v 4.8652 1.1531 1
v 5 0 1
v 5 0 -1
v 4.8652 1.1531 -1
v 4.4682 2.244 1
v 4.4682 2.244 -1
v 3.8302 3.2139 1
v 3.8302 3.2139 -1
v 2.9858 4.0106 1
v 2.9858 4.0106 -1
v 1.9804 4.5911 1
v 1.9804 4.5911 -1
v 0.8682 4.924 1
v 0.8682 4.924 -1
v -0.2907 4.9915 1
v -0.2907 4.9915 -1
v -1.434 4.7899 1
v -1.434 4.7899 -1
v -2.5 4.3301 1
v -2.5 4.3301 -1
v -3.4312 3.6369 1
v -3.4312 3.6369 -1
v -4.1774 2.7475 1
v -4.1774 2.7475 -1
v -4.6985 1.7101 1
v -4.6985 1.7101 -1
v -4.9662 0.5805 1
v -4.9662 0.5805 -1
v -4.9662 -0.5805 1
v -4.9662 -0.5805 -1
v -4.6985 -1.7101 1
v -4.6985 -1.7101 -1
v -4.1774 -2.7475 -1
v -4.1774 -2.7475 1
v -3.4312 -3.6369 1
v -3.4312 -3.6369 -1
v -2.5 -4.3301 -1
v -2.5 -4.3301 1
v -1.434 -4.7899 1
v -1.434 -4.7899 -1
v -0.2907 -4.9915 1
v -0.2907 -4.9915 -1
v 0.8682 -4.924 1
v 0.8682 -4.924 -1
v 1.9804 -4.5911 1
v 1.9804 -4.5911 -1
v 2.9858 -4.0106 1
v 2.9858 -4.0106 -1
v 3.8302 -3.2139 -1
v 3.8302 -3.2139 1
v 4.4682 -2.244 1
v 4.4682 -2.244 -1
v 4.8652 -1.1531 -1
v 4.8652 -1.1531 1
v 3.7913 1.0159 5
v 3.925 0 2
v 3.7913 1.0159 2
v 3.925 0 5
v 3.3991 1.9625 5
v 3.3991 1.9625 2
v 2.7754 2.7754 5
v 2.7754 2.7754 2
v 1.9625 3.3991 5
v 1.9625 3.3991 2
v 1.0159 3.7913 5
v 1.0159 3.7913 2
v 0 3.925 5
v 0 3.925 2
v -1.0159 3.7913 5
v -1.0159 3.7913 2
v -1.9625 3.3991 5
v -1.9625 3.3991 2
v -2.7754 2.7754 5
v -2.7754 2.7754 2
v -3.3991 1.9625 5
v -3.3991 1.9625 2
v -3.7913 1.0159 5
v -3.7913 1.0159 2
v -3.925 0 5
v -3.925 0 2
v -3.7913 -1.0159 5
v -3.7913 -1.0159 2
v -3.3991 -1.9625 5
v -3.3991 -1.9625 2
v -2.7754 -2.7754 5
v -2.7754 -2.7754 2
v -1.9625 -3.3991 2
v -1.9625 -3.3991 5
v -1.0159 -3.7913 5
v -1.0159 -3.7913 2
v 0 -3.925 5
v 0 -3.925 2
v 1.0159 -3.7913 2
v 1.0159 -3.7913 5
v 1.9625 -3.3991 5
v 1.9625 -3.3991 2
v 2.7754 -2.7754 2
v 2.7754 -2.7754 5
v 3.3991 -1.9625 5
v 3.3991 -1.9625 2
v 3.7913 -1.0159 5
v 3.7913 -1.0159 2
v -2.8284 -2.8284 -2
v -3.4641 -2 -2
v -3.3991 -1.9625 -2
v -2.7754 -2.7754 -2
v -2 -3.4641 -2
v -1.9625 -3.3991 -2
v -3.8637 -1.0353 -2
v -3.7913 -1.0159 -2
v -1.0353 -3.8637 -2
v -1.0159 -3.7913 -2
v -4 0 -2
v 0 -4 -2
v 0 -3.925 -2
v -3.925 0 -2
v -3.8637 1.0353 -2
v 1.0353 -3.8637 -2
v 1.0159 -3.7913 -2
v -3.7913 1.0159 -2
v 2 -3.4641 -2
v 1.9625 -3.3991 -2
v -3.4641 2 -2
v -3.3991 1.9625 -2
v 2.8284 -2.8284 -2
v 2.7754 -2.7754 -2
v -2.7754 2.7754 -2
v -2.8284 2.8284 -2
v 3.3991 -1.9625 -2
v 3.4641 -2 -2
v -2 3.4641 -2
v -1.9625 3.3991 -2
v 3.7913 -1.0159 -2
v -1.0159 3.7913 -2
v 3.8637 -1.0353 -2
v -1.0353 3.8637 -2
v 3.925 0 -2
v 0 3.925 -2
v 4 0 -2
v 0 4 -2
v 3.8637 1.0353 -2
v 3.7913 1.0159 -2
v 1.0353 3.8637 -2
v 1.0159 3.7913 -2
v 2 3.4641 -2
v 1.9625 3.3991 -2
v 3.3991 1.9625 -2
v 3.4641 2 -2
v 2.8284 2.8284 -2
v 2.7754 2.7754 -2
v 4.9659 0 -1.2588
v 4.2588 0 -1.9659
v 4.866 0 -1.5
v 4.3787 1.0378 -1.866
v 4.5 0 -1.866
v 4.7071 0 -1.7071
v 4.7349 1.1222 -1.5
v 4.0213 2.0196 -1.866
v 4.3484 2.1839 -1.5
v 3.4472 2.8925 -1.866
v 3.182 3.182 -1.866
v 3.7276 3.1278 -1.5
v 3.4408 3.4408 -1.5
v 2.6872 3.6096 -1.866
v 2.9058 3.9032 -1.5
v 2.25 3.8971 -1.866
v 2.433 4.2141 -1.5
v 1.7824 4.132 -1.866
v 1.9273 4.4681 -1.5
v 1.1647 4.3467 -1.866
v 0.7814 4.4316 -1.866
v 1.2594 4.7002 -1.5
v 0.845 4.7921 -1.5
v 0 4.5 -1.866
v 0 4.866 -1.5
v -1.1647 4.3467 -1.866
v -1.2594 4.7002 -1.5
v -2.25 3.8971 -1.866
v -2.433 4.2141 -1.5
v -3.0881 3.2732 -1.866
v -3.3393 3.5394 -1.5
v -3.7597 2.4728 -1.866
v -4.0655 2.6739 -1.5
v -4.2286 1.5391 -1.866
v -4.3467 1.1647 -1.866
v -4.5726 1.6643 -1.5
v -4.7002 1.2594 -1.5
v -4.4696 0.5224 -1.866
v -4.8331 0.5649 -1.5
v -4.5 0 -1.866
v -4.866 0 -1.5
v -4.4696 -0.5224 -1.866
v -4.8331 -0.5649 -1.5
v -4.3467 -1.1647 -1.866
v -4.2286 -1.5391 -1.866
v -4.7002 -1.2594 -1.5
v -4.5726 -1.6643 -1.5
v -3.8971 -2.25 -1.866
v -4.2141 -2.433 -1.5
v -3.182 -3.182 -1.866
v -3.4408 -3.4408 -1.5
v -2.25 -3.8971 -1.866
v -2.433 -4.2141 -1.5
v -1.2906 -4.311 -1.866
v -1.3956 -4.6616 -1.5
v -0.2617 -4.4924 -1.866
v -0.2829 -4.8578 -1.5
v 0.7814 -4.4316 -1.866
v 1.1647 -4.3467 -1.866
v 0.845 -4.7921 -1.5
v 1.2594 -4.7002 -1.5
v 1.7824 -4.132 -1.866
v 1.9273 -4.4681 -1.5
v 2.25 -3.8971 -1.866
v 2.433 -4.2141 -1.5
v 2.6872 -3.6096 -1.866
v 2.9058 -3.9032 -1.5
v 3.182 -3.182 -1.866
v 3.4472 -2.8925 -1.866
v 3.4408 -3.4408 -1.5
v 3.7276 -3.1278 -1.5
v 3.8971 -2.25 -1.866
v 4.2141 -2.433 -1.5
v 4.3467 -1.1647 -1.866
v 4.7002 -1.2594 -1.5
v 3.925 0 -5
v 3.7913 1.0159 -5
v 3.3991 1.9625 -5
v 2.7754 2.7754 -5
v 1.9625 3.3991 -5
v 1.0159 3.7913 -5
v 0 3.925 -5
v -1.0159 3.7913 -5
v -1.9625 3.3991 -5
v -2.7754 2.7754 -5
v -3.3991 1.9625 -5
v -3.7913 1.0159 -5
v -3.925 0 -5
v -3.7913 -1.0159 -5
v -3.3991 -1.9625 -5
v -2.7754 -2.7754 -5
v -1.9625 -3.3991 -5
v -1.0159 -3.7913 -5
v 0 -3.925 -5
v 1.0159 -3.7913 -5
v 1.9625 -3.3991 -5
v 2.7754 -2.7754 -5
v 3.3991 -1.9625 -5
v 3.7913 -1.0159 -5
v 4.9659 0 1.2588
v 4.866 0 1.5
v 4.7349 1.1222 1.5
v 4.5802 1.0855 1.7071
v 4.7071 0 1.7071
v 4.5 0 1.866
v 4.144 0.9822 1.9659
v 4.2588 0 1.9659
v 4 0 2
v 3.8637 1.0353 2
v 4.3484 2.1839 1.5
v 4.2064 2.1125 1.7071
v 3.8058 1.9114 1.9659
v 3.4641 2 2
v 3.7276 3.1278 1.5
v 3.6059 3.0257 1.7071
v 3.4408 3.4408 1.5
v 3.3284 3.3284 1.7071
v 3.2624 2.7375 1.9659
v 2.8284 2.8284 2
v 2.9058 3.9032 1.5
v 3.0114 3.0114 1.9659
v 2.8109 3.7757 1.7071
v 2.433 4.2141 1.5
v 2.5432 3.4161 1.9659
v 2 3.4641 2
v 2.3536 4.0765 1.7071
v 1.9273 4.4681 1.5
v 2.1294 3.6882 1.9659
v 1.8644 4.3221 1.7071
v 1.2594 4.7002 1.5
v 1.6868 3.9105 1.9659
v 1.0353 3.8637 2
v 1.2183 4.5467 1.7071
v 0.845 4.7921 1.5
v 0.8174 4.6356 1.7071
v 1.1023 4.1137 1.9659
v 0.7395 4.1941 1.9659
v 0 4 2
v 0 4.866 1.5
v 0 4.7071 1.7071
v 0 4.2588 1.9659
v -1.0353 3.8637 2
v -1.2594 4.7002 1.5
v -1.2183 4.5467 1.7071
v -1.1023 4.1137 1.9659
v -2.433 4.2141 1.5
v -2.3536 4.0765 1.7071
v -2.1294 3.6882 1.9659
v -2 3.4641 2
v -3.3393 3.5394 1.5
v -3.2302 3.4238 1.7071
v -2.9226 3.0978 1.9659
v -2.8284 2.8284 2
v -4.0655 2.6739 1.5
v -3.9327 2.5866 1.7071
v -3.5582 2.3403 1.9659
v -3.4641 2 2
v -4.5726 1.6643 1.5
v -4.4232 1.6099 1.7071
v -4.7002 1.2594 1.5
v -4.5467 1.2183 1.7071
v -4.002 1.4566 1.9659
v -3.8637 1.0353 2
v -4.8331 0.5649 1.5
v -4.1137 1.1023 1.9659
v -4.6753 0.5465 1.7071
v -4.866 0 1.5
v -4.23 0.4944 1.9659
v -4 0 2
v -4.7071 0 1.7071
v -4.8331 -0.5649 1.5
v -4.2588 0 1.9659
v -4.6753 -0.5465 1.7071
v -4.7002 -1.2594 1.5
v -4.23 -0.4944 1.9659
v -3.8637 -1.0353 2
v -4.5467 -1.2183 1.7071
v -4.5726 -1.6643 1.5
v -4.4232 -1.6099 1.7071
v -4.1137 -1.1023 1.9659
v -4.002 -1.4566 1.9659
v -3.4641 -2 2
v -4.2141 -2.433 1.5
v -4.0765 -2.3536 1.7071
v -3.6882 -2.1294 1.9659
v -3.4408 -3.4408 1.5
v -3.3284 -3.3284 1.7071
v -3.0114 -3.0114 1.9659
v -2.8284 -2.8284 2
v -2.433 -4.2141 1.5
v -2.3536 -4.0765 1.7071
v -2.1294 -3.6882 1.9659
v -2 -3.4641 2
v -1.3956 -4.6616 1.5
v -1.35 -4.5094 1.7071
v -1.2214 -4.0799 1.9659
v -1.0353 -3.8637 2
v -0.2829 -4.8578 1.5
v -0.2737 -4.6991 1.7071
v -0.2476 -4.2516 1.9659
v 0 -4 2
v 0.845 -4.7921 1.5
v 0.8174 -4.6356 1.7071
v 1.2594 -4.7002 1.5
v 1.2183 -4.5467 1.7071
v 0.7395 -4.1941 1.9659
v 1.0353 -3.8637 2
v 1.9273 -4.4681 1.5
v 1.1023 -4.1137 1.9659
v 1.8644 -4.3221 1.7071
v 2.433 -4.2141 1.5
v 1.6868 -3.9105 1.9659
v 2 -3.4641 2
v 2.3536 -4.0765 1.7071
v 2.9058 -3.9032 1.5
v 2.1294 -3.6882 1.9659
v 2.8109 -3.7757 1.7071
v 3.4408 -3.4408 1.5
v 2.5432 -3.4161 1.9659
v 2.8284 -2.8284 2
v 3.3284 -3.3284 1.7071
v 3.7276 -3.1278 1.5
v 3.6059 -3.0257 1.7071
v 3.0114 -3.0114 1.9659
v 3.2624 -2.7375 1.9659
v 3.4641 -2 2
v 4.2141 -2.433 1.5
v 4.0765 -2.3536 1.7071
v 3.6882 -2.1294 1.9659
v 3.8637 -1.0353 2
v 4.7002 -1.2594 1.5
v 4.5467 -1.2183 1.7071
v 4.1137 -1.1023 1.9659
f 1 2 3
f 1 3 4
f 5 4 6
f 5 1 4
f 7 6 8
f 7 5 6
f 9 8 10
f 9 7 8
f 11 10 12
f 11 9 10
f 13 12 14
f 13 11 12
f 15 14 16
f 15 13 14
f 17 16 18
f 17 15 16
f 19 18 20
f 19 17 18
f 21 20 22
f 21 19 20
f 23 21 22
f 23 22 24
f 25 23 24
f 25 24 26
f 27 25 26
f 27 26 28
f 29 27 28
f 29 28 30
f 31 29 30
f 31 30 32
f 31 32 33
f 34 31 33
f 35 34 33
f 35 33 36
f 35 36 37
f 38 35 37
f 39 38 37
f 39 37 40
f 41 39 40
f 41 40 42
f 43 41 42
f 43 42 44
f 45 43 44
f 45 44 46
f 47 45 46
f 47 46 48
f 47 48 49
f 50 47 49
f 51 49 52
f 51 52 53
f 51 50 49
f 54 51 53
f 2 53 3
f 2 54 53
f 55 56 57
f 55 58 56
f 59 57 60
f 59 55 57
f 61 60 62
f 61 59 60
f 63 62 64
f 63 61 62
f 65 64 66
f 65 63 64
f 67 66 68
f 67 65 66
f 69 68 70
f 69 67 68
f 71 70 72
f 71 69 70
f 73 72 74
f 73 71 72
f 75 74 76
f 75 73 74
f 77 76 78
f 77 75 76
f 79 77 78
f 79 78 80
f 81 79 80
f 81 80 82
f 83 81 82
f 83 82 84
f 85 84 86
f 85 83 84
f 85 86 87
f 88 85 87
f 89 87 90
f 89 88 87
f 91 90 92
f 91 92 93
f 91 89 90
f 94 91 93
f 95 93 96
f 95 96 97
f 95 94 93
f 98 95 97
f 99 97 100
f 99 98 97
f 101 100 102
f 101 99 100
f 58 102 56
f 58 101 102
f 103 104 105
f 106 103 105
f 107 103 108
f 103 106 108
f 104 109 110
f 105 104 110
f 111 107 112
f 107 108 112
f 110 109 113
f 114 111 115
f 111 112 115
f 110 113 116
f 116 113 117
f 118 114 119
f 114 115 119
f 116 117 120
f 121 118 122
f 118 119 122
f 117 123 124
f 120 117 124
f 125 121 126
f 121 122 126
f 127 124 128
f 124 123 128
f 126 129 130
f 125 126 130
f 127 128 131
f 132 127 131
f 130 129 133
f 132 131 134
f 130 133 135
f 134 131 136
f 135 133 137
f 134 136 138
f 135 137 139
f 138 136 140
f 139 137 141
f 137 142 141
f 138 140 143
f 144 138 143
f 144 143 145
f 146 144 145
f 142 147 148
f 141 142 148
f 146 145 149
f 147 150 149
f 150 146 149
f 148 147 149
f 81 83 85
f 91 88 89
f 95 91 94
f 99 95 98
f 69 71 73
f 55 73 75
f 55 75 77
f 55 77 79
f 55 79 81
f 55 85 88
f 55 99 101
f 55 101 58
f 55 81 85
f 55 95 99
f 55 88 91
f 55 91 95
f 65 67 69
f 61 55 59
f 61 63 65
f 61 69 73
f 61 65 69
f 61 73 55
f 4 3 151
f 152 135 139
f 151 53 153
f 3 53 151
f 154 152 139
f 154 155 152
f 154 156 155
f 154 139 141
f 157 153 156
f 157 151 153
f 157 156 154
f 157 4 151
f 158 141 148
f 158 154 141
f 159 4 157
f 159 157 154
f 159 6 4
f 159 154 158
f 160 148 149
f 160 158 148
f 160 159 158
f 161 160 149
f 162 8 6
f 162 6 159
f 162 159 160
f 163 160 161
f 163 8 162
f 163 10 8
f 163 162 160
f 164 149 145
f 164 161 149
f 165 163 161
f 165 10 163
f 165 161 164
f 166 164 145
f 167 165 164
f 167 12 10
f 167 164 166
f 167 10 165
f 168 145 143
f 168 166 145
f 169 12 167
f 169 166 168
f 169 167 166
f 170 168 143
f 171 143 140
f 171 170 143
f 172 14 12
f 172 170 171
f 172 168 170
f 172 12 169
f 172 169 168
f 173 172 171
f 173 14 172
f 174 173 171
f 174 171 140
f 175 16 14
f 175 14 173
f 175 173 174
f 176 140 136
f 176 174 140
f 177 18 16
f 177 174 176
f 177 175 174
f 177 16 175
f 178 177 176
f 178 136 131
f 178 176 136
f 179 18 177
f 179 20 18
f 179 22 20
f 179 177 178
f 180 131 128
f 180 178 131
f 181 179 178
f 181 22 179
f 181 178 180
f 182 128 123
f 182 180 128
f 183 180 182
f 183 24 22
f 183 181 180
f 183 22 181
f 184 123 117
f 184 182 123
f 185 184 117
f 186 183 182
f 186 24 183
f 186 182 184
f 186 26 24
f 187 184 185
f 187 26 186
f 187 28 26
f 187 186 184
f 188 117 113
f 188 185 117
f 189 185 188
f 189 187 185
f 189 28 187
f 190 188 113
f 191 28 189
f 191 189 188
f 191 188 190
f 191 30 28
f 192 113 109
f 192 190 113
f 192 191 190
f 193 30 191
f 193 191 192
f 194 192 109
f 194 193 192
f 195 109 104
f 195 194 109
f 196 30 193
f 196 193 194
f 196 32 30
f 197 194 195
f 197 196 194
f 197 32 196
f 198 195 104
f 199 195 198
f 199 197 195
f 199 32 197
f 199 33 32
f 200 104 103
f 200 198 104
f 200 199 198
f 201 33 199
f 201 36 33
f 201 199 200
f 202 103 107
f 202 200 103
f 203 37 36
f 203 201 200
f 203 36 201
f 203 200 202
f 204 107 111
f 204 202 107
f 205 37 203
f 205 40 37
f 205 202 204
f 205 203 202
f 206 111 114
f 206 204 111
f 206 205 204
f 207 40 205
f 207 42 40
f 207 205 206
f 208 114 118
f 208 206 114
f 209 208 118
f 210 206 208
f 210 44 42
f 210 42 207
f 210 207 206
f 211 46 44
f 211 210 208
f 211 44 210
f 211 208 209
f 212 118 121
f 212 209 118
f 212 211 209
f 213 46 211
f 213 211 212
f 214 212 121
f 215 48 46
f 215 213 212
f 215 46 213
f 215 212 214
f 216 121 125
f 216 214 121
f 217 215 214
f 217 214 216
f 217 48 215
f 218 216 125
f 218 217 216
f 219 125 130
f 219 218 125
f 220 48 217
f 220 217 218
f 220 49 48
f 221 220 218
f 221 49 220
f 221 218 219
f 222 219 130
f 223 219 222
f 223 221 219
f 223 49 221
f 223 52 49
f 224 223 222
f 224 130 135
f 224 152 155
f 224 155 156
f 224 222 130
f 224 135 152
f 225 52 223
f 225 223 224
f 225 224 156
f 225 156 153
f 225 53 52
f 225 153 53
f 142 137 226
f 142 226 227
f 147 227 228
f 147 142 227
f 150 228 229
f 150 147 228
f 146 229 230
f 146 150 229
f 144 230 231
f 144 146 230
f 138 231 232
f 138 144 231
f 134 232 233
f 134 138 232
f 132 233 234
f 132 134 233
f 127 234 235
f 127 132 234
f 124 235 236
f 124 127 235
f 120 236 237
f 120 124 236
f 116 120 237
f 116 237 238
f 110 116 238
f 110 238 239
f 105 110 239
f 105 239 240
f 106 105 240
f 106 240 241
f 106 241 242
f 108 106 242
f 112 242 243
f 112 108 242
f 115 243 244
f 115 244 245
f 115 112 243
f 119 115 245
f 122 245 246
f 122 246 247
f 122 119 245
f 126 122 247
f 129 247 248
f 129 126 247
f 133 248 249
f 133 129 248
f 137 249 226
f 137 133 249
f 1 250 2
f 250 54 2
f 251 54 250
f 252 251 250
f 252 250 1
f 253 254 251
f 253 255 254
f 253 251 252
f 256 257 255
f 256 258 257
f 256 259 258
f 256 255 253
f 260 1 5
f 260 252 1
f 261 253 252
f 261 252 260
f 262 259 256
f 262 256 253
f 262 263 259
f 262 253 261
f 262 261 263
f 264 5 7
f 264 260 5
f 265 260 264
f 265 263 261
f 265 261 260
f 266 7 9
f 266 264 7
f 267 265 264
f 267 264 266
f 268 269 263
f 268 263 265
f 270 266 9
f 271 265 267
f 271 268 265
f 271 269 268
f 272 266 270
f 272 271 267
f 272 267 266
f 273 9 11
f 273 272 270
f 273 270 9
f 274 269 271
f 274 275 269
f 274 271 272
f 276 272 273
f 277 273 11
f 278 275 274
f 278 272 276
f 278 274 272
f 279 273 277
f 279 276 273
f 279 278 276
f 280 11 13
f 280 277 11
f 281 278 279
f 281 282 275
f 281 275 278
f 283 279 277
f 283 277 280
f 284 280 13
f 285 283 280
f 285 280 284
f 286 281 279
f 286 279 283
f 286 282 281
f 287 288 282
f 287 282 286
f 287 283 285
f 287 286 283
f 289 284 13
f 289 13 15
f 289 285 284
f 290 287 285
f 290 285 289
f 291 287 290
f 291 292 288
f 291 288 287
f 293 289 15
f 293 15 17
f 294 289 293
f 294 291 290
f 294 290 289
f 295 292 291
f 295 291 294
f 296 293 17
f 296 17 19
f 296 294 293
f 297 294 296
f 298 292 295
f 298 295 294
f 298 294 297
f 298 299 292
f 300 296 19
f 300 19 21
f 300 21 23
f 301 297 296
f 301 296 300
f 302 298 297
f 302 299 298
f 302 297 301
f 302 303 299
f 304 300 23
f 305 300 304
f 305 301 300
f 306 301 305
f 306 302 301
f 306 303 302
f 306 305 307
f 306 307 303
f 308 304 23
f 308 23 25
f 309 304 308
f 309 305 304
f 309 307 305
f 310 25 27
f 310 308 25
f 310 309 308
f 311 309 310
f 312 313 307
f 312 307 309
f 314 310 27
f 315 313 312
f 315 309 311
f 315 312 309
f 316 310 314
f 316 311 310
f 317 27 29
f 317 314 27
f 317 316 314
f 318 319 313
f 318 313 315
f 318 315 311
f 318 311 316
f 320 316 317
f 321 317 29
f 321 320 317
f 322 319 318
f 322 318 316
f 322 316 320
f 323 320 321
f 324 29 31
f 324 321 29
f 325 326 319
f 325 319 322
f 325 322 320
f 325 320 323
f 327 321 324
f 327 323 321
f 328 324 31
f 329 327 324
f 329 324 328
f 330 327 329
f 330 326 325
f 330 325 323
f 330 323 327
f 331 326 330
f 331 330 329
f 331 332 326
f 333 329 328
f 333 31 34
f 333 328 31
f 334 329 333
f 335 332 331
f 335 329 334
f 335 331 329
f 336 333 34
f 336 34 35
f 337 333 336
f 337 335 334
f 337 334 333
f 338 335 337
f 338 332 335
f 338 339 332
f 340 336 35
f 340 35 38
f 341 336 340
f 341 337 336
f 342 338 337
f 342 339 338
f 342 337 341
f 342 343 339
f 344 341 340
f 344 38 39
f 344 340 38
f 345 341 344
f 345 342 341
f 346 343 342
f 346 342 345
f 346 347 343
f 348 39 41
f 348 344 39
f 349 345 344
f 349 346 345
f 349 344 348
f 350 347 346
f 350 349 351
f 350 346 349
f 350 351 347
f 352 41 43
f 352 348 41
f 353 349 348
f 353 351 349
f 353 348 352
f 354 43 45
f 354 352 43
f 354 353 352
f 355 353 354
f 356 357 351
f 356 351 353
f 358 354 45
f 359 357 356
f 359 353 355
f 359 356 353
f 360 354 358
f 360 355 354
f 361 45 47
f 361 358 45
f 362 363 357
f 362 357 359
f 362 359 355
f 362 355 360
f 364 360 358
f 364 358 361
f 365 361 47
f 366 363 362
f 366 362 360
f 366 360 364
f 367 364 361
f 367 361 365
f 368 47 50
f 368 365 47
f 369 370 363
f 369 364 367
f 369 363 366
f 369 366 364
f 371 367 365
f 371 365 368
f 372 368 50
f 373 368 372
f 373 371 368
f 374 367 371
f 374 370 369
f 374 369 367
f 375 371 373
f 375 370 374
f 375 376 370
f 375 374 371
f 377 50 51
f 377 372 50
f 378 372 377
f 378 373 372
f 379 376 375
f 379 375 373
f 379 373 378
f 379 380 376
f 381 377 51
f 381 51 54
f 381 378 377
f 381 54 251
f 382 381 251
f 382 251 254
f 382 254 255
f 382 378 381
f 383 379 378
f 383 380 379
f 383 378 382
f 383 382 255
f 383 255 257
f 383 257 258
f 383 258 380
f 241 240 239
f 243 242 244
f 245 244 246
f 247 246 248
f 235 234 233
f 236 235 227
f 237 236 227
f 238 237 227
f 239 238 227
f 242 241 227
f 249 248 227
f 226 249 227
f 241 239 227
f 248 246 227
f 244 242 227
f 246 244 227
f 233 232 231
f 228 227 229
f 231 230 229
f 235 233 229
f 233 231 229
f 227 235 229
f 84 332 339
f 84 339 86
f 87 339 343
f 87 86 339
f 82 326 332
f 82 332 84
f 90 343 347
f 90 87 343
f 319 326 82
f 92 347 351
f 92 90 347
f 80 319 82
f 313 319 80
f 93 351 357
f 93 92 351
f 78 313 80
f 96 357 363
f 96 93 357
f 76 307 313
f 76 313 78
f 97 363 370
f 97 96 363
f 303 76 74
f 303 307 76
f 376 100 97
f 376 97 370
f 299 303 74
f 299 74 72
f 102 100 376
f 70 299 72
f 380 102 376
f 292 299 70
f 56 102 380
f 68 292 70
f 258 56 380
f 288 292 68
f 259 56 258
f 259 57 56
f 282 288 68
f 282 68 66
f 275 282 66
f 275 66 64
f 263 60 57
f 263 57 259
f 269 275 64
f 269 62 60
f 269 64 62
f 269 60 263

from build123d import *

# Parameters (mm, degrees)
F0_R     = 3.925
F1_DEPTH = 5
F0_R_2   = 5
F2_DEPTH = 2
F3_R     = 1


with BuildPart() as f1:
    # F0 (on Top) → F1 (new body, symmetric)
    with BuildSketch(Plane.XY):
        Circle(F0_R)
    extrude(amount=F1_DEPTH, both=True)

    # F0 (on Top) → F2 (join, symmetric)
    with BuildSketch(Plane.XY):
        Circle(F0_R_2)
        Circle(F0_R, mode=Mode.SUBTRACT)
    extrude(amount=F2_DEPTH, both=True)

    # F3
    f3_edges = [f1.edges().sort_by_distance(p)[0] for p in [
        (-5, 0, 2),
        (-5, 0, -2),
    ]]
    fillet(f3_edges, radius=F3_R)


solid = f1.part
